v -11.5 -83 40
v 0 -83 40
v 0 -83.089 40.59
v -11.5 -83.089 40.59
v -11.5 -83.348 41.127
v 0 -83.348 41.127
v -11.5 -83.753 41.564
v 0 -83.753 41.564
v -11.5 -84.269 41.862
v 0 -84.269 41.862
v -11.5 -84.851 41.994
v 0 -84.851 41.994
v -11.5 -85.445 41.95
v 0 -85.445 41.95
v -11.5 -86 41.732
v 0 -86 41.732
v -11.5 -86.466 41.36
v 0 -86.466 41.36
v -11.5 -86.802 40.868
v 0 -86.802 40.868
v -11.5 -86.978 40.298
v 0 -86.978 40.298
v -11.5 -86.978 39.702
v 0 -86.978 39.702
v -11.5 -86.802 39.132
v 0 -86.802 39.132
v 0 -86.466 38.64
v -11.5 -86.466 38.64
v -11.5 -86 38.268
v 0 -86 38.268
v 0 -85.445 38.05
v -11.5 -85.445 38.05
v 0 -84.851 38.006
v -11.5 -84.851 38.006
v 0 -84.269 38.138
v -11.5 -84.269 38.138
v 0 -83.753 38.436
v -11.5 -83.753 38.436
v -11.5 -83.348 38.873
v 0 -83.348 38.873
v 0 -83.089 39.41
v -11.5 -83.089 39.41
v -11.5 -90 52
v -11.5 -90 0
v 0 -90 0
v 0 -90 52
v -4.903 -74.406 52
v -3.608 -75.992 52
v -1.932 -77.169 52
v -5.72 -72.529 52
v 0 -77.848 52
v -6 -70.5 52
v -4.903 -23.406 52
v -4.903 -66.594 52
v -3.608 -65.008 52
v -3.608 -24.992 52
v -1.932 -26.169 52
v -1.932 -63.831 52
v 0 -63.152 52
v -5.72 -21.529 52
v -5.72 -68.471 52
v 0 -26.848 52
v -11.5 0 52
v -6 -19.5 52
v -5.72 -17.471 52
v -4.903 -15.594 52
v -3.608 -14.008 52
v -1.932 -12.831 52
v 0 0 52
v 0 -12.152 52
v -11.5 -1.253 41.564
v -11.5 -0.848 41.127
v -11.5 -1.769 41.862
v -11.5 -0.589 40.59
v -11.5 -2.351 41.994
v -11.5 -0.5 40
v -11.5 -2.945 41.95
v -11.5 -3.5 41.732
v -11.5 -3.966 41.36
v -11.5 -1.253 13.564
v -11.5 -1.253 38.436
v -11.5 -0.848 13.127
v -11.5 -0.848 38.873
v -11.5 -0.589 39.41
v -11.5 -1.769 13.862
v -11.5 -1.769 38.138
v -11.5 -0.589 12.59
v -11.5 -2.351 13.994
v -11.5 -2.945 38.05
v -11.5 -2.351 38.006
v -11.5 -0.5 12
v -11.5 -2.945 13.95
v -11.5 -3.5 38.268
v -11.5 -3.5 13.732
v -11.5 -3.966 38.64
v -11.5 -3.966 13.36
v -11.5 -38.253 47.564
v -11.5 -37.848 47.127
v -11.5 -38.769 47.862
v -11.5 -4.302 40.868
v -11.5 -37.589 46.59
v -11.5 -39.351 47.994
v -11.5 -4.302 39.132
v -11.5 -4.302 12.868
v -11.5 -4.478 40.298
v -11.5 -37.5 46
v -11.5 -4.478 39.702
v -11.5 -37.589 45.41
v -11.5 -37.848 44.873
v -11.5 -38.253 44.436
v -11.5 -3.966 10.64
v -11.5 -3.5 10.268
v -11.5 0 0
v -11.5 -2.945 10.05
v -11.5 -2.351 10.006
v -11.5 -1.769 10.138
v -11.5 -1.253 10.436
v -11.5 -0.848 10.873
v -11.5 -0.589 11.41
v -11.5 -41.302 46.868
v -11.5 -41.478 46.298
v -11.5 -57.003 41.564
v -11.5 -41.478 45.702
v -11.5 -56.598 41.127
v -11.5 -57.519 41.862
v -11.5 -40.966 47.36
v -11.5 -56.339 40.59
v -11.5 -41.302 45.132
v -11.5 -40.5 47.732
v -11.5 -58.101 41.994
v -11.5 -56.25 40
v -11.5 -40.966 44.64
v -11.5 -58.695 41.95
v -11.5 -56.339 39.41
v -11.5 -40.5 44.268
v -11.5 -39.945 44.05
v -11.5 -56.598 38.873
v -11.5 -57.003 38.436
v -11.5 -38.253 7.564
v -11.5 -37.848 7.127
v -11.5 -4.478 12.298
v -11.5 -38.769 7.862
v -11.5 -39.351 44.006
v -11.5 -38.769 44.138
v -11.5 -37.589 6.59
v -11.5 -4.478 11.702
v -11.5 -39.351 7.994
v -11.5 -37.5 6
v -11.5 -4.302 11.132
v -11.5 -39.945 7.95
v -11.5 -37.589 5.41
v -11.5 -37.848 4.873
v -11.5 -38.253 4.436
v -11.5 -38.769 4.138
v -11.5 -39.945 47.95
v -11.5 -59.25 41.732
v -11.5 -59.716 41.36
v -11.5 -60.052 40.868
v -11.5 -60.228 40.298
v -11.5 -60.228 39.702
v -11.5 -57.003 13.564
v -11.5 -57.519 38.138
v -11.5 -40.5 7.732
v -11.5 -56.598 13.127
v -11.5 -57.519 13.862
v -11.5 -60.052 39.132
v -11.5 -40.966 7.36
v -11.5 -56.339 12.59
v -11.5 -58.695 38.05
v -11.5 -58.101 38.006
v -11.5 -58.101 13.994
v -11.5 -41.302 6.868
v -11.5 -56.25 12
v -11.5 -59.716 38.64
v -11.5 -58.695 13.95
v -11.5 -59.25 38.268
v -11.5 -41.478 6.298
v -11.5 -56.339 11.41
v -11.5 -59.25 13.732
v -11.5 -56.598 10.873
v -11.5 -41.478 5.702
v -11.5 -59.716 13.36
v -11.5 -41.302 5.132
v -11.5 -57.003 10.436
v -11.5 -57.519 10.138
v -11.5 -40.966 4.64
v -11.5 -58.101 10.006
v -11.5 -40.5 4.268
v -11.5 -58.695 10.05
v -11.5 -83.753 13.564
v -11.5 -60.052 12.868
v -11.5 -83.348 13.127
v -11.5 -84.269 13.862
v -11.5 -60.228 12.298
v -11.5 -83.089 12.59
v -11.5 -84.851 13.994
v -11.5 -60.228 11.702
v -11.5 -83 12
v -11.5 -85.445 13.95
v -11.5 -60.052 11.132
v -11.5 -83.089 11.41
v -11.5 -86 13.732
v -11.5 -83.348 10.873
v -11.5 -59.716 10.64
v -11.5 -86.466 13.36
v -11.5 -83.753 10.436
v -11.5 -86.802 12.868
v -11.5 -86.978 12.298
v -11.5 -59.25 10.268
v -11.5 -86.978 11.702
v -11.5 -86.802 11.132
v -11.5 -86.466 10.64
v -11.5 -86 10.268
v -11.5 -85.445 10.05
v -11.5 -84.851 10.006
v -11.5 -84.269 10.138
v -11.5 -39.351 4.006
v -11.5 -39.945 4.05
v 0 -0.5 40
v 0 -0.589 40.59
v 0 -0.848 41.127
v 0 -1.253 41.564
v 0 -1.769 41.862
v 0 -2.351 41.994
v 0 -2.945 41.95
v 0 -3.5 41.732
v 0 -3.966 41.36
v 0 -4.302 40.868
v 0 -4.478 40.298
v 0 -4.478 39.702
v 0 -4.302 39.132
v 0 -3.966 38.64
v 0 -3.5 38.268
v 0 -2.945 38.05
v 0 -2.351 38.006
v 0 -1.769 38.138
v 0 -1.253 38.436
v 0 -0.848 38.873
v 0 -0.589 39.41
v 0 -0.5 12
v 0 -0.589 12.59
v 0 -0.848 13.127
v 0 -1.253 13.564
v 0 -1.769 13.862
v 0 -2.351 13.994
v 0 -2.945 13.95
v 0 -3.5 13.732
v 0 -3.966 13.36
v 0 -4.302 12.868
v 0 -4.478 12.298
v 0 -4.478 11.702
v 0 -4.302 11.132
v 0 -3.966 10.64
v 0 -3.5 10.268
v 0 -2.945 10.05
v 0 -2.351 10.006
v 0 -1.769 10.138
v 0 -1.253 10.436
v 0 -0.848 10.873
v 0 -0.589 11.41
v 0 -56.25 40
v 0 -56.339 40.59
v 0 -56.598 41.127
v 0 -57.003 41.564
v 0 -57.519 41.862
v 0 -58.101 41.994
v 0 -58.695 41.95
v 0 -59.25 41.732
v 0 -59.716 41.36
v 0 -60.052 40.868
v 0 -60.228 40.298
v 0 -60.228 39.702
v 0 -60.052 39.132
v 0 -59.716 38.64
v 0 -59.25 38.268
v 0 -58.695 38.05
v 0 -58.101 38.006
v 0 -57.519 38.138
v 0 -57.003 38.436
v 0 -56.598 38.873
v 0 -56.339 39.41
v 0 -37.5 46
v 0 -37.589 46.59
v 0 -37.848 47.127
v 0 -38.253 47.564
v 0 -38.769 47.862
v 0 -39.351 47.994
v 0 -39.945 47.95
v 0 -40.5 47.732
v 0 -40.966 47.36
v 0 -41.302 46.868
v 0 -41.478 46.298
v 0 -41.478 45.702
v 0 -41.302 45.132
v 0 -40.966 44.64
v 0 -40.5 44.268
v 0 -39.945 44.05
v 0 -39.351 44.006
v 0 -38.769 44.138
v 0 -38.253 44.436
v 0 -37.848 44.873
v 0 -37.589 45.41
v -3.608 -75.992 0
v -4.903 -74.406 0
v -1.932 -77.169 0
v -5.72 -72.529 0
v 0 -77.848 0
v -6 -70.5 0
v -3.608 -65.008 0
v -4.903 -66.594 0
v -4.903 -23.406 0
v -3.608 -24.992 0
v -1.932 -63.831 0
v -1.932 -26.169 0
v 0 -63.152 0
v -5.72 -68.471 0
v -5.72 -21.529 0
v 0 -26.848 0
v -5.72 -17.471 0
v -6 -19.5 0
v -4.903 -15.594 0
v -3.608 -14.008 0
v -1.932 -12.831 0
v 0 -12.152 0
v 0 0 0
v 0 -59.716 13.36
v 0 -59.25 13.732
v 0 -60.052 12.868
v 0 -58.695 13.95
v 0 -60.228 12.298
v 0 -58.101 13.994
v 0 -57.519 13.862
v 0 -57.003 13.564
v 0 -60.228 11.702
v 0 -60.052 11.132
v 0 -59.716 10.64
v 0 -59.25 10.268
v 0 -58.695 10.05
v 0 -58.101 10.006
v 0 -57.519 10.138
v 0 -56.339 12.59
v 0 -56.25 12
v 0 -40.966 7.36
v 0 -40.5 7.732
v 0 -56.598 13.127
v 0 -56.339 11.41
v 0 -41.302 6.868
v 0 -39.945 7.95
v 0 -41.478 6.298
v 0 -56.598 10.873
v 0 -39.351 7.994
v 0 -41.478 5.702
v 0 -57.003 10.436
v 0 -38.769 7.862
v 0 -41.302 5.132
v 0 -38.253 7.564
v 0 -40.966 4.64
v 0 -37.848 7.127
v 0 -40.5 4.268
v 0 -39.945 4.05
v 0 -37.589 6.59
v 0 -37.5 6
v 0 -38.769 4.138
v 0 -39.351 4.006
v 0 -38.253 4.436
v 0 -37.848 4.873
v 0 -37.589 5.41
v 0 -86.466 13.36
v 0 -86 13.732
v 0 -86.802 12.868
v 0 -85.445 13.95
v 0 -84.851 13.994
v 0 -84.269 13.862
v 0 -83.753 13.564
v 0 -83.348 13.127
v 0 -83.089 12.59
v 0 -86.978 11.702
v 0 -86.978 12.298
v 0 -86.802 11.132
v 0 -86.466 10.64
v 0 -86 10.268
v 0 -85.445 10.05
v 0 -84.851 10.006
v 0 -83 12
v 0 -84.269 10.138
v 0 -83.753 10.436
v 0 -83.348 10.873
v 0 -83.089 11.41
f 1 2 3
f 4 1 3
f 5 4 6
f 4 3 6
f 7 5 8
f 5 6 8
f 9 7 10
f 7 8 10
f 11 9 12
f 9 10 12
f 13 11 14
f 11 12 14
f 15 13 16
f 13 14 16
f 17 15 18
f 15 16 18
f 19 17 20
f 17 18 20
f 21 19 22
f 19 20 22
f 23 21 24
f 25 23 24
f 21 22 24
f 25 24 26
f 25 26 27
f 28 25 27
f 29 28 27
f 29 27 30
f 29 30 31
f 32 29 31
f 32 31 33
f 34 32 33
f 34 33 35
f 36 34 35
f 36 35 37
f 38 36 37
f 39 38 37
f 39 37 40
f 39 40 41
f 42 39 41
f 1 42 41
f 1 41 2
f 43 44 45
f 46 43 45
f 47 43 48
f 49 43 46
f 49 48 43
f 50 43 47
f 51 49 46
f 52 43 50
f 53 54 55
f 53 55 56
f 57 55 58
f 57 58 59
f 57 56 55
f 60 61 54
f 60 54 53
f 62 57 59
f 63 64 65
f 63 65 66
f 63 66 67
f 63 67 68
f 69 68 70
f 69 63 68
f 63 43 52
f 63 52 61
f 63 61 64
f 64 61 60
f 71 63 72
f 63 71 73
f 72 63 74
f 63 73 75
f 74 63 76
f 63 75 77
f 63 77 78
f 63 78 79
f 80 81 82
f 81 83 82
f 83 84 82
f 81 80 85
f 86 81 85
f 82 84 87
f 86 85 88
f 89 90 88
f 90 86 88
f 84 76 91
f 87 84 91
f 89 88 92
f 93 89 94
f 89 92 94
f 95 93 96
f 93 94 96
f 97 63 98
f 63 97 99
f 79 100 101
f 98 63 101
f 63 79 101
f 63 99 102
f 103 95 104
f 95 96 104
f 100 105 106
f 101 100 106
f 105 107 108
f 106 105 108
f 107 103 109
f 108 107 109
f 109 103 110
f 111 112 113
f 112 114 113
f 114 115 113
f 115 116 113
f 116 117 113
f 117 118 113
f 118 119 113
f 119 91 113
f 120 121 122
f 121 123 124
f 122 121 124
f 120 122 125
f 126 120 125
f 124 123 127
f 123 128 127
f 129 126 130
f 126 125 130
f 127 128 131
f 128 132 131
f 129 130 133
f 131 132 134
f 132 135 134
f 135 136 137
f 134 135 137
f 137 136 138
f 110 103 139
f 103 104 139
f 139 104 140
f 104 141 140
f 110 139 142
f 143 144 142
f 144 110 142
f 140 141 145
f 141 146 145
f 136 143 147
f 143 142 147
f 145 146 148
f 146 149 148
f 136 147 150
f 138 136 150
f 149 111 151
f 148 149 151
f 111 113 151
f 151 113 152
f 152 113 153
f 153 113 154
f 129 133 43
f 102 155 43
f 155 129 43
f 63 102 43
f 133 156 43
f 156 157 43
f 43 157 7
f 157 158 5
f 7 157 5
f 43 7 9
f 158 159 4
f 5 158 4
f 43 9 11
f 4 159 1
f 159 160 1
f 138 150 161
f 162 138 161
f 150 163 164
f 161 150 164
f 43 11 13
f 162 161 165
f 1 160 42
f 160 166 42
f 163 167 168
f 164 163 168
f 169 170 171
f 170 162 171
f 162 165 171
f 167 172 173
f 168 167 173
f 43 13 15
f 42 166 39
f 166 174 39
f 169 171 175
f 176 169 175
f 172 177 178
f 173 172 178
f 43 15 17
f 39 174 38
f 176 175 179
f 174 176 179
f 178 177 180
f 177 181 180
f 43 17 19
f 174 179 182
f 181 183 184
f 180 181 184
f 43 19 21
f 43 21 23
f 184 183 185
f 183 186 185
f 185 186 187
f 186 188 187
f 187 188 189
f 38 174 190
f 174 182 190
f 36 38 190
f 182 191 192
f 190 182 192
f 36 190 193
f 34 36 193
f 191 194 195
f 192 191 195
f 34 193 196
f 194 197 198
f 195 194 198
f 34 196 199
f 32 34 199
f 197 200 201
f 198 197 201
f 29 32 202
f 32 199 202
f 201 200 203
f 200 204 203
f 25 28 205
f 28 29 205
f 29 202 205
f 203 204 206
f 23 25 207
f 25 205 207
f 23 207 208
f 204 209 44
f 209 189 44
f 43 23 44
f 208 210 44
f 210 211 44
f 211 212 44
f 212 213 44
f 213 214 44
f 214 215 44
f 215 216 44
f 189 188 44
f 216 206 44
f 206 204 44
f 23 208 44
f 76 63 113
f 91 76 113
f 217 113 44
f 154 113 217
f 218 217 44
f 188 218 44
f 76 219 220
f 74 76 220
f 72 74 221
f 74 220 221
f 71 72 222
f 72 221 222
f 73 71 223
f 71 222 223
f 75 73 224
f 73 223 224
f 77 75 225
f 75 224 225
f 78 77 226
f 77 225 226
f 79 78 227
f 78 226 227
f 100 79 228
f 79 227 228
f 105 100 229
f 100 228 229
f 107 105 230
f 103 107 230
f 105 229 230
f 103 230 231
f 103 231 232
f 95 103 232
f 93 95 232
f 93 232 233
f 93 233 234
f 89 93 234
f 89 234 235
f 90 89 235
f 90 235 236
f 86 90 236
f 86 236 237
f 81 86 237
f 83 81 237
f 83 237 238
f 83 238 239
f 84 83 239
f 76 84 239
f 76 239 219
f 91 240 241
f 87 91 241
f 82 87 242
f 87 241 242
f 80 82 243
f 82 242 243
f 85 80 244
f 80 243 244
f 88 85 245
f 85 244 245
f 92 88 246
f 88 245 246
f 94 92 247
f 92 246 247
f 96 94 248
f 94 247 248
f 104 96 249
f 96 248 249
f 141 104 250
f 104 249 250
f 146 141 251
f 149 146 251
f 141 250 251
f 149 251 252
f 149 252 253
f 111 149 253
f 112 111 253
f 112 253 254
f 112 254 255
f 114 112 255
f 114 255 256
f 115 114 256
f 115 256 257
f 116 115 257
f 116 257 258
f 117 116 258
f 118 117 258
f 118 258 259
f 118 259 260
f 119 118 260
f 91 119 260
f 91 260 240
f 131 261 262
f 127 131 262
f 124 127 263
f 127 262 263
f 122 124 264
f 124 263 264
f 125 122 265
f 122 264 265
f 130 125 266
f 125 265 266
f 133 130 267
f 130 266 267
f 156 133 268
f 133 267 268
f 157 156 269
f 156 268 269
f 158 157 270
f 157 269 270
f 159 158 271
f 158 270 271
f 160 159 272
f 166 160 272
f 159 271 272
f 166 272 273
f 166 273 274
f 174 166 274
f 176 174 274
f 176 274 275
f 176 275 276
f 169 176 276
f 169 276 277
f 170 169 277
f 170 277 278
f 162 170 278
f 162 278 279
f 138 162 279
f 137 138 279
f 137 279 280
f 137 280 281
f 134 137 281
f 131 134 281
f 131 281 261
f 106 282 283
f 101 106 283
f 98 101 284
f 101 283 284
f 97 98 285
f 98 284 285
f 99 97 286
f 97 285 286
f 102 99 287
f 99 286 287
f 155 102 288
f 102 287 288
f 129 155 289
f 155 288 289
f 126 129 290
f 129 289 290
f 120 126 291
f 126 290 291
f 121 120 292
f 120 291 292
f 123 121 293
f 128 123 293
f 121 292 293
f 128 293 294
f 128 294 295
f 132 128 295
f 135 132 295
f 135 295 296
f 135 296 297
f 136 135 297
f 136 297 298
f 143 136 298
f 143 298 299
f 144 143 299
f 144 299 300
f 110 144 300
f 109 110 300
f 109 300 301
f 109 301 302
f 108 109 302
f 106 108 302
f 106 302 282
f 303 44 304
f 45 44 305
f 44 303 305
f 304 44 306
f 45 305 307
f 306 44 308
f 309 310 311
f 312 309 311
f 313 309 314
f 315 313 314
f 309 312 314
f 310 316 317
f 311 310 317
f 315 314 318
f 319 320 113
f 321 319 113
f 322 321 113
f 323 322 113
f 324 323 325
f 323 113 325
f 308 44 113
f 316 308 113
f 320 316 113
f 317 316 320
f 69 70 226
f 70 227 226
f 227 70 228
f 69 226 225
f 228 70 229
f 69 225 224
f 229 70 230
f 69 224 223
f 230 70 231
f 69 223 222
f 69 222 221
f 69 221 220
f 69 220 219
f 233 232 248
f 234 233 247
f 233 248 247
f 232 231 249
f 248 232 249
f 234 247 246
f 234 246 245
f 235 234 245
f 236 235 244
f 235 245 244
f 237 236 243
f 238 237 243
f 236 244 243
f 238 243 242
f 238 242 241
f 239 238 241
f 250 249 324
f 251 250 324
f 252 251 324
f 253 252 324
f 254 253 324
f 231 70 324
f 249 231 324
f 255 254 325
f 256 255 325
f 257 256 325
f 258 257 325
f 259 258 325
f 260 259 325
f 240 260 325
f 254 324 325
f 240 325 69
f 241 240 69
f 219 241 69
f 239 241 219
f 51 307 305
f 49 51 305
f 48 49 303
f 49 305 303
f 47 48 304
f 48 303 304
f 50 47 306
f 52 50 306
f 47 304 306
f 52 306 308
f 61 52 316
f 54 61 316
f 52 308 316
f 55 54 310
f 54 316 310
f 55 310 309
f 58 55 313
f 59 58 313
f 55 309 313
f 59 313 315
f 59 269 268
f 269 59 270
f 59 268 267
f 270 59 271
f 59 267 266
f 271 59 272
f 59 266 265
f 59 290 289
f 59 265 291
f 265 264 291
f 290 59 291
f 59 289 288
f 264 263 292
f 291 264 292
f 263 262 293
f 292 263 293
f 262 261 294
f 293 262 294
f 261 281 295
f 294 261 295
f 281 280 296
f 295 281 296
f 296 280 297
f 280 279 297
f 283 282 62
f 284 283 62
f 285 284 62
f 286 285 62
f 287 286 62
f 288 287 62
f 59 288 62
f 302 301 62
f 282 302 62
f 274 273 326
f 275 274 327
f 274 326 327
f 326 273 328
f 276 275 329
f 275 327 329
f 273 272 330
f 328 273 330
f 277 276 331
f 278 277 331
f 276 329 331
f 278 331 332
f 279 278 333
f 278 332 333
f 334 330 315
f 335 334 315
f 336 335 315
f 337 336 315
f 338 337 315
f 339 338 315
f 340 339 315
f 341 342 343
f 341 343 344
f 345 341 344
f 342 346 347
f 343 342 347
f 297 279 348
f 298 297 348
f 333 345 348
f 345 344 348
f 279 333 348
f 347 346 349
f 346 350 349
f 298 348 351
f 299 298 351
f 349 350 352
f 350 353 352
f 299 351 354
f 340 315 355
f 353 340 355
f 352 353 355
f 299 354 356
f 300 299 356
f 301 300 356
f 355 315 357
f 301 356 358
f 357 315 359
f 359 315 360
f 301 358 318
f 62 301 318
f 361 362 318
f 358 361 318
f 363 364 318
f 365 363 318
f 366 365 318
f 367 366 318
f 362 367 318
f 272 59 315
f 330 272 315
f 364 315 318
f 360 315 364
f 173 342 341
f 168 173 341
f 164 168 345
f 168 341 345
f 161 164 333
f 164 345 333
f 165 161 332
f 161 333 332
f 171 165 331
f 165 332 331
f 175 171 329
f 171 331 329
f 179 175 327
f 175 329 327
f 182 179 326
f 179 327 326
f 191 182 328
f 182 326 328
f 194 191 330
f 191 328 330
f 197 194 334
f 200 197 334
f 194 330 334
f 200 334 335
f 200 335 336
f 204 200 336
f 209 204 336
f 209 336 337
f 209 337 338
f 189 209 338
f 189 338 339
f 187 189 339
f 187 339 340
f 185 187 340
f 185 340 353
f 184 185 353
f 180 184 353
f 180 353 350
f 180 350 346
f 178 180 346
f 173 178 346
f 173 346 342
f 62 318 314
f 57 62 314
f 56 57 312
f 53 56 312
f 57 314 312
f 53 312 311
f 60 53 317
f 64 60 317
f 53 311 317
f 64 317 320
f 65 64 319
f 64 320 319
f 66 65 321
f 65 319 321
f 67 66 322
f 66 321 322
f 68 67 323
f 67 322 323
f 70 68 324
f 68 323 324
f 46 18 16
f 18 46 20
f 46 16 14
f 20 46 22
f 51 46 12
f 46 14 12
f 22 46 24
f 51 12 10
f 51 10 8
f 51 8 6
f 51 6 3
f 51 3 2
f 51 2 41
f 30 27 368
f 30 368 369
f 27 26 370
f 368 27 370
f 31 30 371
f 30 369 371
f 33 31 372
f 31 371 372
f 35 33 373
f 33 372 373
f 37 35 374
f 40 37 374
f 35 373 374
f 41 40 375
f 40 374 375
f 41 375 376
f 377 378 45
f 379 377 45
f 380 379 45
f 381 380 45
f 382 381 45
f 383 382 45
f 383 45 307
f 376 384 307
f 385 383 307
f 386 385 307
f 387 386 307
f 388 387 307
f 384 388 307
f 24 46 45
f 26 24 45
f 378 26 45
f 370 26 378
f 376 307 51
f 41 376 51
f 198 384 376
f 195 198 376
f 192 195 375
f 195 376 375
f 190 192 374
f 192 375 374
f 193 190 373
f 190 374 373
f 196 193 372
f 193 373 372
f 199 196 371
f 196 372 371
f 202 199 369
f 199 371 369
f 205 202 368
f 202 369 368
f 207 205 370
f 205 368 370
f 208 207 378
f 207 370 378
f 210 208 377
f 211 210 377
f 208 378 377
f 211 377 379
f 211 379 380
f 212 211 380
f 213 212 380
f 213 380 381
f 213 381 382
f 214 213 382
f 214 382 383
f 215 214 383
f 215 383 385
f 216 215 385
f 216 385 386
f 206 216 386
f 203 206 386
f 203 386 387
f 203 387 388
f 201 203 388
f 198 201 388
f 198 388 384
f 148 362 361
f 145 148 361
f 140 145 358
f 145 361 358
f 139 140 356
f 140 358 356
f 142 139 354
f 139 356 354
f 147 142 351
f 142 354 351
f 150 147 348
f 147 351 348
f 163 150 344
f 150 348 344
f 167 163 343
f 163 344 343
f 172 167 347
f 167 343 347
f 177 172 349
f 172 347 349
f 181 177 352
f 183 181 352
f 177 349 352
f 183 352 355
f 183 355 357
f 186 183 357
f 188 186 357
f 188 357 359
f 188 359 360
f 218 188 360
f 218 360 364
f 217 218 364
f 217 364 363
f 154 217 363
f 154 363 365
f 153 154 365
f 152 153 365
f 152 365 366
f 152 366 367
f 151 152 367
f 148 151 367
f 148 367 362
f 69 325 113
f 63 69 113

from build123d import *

# Parameters (mm, degrees)
BOSS_EXTRUDE1_DEPTH     = 52
SKETCH2_R               = 2
CUT_EXTRUDE1_DEPTH      = 105.576527003
ESQUISSE1_R             = 2
ENL_V_MAT_EXTRU_1_DEPTH = 105.576527003
ESQUISSE2_R             = 2
ENL_V_MAT_EXTRU_2_DEPTH = 105.576527003


with BuildPart() as part:
    # Sketch1 → Boss-Extrude1 (new body)
    with BuildSketch(Plane.XY):
        with BuildLine():
            Line((0, -12.151530772), (0, 0))
            Line((0, 0), (-11.5, 0))
            Line((-11.5, 0), (-11.5, -45))
            Line((-11.5, -45), (0, -45))
            Line((0, -45), (0, -26.848469228))
            ThreePointArc((0, -26.848469228), (-6, -19.5), (0, -12.151530772))
        make_face()
        with BuildLine():
            Line((0, -45), (-11.5, -45))
            Line((-11.5, -45), (-11.5, -90))
            Line((-11.5, -90), (0, -90))
            Line((0, -90), (0, -77.848469228))
            ThreePointArc((0, -77.848469228), (-6, -70.5), (0, -63.151530772))
            Line((0, -63.151530772), (0, -45))
        make_face()
    extrude(amount=BOSS_EXTRUDE1_DEPTH)

    # Sketch2 → Cut-Extrude1 (cut, through all)
    with BuildSketch(Plane(origin=(0, 0, 0), x_dir=(0, 0, -1), z_dir=(1, 0, 0))):
        with Locations(Location((-40, -2.5, 0), (0, 0, 90))):
            Circle(SKETCH2_R)
        with Locations(Location((-40, -85, 0), (0, 0, 90))):
            Circle(SKETCH2_R)
        with Locations(Location((-12, -85, 0), (0, 0, 90))):
            Circle(SKETCH2_R)
        with Locations(Location((-12, -2.5, 0), (0, 0, 90))):
            Circle(SKETCH2_R)
    extrude(amount=-CUT_EXTRUDE1_DEPTH, mode=Mode.SUBTRACT)

    # Esquisse1 → Enlèv. mat.-Extru.1 (cut, through all)
    with BuildSketch(Plane(origin=(0, 0, 0), x_dir=(0, 0, -1), z_dir=(1, 0, 0))):
        with Locations(Location((-12, -58.25, 0), (0, 0, 90))):
            Circle(ESQUISSE1_R)
        with Locations(Location((-40, -58.25, 0), (0, 0, 90))):
            Circle(ESQUISSE1_R)
    extrude(amount=-ENL_V_MAT_EXTRU_1_DEPTH, mode=Mode.SUBTRACT)

    # Esquisse2 → Enlèv. mat.-Extru.2 (cut, through all)
    with BuildSketch(Plane(origin=(0, 0, 0), x_dir=(0, 0, -1), z_dir=(1, 0, 0))):
        with Locations(Location((-6, -39.5, 0), (0, 0, 90))):
            Circle(ESQUISSE2_R)
        with Locations(Location((-46, -39.5, 0), (0, 0, 90))):
            Circle(ESQUISSE2_R)
    extrude(amount=-ENL_V_MAT_EXTRU_2_DEPTH, mode=Mode.SUBTRACT)


solid = part.part
